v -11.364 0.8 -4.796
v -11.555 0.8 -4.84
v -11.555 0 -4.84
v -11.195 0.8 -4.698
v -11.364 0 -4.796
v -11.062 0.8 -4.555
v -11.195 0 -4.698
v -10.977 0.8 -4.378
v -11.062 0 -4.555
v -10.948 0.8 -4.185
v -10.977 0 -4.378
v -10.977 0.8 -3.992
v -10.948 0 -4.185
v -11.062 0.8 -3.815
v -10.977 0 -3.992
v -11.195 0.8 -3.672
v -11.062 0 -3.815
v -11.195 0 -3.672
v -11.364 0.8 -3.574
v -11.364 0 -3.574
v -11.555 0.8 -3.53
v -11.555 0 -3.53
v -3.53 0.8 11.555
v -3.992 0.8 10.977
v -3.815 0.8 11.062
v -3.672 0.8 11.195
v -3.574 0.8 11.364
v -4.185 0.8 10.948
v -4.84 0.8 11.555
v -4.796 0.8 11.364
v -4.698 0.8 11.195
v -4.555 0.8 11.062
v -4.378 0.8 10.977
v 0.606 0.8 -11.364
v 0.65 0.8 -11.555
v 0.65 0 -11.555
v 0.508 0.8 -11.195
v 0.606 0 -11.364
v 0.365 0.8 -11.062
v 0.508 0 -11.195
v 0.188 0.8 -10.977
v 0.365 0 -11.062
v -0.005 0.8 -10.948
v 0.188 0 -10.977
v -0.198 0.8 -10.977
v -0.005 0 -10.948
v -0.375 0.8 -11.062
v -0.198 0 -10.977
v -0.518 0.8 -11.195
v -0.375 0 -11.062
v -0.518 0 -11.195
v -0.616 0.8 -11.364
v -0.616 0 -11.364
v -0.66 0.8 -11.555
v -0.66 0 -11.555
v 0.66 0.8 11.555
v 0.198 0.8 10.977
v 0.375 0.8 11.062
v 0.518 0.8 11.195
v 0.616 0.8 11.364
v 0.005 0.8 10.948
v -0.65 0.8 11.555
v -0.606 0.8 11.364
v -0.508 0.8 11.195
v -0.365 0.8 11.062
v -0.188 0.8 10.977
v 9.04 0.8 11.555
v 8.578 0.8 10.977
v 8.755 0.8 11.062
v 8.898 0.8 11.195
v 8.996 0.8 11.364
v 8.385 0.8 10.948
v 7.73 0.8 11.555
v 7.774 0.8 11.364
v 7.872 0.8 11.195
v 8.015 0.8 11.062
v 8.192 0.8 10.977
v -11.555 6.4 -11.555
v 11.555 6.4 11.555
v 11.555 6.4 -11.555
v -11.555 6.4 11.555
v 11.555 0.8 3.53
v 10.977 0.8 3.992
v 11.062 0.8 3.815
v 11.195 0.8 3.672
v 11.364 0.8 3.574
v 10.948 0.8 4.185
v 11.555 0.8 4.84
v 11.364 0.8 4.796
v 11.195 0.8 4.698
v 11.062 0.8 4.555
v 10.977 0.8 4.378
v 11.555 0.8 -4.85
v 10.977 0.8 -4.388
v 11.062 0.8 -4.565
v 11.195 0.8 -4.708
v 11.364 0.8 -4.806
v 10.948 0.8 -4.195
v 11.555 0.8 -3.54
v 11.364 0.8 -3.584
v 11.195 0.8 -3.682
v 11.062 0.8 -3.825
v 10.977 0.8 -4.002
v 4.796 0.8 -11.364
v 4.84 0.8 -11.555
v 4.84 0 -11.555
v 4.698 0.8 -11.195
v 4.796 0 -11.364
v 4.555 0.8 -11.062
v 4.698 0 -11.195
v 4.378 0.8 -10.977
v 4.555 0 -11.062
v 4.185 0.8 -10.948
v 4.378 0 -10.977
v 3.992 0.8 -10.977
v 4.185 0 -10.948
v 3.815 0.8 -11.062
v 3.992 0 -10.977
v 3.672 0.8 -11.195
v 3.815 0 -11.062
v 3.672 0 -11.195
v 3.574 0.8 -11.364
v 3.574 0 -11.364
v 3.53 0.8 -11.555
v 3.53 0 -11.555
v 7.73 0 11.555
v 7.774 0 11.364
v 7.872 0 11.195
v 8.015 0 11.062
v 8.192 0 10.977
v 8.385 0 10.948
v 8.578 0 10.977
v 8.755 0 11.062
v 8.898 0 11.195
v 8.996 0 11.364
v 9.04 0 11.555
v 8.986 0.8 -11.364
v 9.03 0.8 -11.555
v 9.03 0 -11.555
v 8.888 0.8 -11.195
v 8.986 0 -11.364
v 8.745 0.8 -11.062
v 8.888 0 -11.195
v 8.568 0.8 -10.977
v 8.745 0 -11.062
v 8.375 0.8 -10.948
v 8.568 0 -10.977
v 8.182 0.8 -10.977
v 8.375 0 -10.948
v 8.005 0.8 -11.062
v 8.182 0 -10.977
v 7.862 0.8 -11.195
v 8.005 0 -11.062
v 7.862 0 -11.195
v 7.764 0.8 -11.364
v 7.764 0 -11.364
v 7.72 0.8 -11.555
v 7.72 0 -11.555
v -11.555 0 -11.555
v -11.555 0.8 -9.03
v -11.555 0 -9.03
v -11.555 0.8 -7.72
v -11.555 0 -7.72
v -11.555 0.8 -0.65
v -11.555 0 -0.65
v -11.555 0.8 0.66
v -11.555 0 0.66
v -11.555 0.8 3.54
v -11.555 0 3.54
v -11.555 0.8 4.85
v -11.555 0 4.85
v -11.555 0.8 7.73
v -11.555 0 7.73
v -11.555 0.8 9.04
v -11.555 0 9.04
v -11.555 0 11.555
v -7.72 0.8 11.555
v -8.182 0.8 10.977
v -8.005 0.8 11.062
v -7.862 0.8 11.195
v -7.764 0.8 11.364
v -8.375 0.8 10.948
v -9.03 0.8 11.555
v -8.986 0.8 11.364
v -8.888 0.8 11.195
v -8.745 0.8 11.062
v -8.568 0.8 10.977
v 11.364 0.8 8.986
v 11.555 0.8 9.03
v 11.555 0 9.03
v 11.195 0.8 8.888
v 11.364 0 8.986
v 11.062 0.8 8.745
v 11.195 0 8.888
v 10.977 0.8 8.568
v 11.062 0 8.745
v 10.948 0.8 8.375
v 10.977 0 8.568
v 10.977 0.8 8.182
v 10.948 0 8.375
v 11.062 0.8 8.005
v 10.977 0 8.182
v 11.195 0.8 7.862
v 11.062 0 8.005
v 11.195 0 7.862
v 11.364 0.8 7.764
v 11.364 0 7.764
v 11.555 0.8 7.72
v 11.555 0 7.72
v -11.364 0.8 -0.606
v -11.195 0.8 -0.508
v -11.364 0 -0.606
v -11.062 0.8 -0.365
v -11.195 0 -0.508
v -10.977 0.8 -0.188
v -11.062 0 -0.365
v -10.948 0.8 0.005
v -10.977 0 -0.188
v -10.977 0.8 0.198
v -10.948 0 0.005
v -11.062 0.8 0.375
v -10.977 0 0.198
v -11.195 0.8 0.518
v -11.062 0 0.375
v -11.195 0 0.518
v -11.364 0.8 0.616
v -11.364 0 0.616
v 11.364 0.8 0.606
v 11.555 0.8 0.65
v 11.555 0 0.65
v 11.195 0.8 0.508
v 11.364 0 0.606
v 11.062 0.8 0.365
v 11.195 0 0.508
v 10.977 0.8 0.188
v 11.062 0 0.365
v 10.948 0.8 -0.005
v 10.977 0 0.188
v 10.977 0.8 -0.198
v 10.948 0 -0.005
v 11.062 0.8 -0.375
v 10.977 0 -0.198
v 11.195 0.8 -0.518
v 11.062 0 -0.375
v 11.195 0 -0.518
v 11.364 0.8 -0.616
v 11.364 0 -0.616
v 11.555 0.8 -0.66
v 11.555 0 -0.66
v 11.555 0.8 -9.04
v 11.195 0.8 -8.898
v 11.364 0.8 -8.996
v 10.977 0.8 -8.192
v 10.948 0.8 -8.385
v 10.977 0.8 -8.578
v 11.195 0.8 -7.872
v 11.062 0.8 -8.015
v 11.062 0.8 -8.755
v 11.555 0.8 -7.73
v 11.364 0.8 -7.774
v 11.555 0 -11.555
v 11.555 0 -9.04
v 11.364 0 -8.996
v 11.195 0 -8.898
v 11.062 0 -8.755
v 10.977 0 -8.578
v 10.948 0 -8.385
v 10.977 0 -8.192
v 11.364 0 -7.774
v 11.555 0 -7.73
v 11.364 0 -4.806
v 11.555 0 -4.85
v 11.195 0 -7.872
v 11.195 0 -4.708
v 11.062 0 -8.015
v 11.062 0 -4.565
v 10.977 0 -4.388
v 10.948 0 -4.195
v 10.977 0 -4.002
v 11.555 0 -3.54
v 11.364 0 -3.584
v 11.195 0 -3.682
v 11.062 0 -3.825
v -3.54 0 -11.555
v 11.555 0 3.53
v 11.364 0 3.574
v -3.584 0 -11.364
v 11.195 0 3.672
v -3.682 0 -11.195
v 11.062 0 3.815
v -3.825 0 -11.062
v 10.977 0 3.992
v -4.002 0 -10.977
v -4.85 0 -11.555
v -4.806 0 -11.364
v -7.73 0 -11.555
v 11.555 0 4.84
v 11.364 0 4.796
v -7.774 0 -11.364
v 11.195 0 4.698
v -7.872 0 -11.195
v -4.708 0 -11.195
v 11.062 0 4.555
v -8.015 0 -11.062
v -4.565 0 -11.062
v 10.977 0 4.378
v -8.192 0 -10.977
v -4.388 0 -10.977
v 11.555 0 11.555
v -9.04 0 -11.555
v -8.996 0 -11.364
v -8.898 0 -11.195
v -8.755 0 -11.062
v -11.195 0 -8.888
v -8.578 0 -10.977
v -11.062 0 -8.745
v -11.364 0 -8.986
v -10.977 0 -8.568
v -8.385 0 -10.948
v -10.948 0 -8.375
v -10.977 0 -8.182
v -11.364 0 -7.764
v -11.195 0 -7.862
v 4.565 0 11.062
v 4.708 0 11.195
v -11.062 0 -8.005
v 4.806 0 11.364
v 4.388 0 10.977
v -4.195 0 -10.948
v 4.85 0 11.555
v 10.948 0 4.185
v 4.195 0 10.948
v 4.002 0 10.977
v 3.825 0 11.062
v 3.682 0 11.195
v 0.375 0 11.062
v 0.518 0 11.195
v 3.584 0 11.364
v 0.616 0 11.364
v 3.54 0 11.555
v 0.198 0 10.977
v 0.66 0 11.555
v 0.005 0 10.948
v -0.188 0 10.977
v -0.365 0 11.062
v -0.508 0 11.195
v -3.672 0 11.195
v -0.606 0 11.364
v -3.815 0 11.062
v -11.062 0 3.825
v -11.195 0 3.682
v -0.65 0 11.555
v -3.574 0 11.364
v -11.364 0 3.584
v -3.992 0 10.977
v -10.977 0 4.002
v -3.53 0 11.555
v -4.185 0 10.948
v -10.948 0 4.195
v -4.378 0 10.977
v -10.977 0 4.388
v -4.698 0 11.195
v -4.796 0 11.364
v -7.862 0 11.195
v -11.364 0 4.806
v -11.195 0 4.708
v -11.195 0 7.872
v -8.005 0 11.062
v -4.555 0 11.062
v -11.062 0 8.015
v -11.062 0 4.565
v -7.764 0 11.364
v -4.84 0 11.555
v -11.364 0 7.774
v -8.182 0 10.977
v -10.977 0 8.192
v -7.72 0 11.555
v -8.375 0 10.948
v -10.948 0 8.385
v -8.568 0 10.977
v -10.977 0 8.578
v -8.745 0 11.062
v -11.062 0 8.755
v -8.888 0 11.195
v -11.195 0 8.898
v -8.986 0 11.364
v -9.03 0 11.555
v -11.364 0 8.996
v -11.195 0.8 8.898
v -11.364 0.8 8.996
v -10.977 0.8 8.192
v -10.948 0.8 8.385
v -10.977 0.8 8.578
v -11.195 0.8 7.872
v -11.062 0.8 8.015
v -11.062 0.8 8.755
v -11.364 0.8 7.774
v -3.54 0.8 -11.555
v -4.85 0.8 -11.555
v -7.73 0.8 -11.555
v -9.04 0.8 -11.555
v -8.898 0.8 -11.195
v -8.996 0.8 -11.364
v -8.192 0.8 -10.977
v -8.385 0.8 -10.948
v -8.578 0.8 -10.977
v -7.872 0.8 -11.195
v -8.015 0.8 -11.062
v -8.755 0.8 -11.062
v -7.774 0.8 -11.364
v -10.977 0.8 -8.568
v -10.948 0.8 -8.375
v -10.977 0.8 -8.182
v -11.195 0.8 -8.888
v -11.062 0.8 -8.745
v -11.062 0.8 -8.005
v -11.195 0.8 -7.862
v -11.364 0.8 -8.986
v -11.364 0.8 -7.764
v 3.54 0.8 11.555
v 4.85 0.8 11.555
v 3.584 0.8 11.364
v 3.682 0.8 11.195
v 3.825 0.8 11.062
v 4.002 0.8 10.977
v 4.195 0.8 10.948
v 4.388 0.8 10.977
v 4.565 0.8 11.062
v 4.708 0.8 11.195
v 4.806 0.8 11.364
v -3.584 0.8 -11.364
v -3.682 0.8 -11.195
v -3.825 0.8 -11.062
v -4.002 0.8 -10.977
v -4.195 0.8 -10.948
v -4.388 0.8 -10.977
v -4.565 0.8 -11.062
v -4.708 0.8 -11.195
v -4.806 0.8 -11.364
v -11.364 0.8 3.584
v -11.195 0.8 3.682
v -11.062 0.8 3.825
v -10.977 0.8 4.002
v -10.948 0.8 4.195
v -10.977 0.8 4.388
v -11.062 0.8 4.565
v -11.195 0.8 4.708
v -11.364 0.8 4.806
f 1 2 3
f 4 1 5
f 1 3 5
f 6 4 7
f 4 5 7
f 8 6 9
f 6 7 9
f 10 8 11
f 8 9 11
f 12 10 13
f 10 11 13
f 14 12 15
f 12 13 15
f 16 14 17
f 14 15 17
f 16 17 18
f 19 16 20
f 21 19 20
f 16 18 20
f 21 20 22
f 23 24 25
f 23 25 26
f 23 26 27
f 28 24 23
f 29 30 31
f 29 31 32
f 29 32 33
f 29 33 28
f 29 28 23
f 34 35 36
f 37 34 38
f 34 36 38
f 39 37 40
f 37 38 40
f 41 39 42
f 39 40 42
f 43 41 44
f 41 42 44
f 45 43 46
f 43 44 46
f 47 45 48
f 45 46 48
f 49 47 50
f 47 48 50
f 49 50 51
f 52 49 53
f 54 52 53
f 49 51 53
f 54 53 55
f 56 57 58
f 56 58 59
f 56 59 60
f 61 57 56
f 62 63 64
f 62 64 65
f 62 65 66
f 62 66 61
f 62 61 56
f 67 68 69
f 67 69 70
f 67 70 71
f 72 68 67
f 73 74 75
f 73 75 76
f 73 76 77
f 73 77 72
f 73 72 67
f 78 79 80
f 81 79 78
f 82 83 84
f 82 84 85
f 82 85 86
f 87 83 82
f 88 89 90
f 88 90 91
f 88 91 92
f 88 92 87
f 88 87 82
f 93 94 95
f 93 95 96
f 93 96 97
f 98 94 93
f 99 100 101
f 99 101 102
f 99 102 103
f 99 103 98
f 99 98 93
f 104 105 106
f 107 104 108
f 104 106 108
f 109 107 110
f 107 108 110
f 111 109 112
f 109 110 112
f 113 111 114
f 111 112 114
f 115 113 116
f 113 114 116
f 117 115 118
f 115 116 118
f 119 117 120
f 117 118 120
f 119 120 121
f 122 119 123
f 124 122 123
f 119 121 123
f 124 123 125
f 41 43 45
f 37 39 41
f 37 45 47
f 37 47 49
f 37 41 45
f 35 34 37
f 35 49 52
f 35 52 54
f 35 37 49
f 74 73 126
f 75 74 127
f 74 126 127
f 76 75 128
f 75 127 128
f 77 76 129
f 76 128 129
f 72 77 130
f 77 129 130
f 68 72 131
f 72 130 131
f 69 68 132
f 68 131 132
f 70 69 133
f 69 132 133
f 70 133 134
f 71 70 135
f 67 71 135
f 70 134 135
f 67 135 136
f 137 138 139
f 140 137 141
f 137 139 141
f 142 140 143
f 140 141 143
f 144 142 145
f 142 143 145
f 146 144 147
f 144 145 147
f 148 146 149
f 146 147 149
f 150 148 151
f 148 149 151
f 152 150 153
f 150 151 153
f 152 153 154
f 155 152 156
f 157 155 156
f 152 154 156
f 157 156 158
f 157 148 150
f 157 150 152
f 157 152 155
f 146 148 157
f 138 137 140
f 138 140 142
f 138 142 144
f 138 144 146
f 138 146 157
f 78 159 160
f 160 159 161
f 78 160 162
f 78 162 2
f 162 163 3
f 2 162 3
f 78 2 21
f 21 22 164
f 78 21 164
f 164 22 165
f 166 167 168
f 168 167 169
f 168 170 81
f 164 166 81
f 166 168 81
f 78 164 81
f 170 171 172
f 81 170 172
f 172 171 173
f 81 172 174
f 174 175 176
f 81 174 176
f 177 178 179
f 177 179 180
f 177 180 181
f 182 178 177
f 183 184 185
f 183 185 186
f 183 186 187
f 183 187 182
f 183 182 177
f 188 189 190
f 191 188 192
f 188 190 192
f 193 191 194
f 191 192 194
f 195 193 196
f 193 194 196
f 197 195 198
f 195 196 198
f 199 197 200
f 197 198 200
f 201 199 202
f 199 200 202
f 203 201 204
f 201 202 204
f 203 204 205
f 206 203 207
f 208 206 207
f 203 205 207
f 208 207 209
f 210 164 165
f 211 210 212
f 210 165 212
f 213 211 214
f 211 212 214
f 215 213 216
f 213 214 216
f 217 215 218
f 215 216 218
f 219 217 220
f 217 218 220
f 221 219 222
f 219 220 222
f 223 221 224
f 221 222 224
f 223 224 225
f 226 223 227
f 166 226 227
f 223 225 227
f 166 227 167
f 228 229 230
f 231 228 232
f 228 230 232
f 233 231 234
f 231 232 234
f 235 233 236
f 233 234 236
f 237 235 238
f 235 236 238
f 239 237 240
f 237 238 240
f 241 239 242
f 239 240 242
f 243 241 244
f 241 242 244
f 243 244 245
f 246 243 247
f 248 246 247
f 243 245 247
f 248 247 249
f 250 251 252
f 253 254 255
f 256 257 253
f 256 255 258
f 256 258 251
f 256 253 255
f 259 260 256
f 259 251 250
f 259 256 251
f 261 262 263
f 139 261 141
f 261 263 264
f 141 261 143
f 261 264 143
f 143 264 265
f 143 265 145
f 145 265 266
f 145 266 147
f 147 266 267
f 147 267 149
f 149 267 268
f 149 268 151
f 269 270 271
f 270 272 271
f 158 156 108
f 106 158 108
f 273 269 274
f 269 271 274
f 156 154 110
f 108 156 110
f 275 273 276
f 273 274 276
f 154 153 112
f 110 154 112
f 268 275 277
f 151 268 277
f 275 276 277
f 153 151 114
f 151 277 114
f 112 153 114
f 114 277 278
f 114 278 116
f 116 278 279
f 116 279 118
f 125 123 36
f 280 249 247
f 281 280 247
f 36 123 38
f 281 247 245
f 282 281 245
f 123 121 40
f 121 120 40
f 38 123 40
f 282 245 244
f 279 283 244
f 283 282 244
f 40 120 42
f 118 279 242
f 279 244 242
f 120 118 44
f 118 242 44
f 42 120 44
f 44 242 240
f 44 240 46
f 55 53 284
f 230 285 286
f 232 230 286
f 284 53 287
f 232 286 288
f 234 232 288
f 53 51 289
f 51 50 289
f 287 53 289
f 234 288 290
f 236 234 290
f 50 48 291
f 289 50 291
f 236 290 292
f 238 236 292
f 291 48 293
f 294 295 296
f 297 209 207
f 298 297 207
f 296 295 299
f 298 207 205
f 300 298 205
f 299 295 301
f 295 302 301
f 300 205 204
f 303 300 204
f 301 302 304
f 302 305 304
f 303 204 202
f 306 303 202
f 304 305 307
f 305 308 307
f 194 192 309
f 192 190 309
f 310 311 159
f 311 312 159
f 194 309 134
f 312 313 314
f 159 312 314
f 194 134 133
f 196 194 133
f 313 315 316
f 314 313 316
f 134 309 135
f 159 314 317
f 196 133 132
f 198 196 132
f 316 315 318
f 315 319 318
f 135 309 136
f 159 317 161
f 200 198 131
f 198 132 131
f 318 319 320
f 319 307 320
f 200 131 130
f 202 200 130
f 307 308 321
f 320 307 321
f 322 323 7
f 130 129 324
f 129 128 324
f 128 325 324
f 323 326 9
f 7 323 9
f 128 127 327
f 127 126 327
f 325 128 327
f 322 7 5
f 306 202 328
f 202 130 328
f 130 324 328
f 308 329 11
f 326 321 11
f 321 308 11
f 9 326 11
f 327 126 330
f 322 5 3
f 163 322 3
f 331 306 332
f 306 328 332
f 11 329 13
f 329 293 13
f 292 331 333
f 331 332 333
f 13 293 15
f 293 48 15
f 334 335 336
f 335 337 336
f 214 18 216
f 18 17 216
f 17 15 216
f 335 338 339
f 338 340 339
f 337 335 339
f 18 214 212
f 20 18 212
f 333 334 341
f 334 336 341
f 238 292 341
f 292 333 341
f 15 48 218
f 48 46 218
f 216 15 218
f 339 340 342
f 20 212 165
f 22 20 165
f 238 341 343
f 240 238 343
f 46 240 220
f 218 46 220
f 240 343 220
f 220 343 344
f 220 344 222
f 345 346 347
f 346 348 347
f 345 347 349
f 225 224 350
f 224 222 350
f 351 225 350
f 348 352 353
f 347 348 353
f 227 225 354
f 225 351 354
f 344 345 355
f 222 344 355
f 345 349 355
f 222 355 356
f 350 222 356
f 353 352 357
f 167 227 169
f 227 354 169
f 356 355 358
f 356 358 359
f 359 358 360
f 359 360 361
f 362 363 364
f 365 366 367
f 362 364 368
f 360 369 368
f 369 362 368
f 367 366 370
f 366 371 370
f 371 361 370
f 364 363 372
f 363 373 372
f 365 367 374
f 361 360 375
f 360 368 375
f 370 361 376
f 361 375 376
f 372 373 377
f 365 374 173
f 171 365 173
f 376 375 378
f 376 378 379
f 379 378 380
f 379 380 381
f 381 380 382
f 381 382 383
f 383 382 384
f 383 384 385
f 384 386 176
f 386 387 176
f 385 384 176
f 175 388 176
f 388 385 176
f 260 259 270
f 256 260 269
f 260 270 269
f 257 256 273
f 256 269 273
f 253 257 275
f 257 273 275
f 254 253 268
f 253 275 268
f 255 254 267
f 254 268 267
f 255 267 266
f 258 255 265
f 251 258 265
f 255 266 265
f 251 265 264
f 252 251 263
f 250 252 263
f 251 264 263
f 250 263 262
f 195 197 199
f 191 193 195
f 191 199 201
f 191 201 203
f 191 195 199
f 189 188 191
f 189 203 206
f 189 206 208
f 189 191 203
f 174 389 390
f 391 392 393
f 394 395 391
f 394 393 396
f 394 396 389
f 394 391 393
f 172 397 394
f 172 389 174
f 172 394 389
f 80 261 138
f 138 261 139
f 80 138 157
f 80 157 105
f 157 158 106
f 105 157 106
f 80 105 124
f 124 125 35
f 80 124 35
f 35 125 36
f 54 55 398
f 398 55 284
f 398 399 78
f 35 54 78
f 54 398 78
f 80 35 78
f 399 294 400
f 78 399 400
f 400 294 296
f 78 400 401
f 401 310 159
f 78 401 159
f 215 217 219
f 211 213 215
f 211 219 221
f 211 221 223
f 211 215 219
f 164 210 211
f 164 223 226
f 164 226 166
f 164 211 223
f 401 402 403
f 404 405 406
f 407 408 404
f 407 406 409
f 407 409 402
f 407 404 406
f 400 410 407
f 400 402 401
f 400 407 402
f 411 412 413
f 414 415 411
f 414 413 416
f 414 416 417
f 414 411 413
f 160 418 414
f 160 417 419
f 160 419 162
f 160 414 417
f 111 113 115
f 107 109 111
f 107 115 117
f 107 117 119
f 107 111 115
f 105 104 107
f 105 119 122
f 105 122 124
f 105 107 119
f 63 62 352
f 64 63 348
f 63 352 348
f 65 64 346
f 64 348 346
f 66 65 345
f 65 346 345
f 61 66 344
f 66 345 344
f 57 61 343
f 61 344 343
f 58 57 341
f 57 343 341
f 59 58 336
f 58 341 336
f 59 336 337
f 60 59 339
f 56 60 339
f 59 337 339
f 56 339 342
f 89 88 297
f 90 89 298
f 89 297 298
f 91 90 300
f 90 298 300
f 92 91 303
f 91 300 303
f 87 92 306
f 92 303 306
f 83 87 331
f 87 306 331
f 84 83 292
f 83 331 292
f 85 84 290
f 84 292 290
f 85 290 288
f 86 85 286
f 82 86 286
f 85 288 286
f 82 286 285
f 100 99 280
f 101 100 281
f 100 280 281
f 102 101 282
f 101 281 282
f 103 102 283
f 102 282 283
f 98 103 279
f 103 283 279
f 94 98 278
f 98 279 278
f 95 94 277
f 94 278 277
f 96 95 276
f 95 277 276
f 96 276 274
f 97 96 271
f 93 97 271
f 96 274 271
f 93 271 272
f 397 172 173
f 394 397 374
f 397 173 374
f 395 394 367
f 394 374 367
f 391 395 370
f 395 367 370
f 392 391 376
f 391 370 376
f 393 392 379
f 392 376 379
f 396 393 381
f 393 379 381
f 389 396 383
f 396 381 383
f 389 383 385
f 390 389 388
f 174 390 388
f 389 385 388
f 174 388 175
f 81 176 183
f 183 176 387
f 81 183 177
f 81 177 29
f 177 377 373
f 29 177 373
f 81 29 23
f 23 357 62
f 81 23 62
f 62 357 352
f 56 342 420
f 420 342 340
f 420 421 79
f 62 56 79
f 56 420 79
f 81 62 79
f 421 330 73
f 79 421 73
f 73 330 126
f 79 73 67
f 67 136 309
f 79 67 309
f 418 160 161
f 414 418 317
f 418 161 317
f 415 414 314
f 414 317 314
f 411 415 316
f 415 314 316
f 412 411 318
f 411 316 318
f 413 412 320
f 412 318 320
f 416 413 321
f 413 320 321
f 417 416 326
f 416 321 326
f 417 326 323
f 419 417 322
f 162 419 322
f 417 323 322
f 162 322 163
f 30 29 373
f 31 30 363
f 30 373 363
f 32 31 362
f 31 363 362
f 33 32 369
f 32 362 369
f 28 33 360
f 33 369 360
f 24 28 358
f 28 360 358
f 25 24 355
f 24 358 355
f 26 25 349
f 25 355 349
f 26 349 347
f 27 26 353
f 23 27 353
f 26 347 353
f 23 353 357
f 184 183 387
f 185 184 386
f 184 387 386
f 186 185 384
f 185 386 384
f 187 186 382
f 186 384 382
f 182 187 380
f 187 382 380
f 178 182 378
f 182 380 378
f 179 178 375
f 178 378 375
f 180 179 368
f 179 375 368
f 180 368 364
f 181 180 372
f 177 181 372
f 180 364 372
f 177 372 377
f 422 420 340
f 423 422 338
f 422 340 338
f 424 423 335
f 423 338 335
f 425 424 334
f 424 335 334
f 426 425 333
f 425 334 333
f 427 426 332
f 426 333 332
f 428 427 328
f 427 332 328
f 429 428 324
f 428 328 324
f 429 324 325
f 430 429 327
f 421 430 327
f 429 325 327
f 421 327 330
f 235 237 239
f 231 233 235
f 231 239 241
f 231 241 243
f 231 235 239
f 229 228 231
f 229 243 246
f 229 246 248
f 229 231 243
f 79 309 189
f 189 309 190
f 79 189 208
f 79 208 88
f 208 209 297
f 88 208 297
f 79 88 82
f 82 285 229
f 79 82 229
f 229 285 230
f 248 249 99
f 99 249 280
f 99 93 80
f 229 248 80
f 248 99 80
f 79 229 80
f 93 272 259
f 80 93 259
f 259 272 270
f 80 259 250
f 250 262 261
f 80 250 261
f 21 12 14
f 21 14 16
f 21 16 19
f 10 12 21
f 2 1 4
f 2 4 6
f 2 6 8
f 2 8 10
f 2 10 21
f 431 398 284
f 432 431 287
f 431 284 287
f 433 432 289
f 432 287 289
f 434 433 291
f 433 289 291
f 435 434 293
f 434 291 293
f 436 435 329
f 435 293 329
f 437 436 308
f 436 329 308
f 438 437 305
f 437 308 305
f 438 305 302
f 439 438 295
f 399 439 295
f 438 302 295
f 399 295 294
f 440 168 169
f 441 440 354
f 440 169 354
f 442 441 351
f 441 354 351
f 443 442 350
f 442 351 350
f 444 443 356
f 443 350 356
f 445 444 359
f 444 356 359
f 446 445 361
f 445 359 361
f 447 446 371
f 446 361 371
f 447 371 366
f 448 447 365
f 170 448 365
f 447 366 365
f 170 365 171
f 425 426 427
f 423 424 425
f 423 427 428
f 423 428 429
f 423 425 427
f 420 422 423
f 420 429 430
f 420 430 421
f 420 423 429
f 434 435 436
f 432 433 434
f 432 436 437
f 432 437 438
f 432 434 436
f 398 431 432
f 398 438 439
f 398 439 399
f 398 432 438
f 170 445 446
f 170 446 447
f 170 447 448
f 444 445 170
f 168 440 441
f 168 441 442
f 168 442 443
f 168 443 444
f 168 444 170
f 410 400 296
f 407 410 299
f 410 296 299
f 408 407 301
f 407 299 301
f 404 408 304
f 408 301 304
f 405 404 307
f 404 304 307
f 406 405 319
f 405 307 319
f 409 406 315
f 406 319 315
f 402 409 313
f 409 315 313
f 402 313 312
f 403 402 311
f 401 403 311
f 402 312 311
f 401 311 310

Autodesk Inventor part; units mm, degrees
ref_plane "YZ Plane" through (0, 0, 0) normal (1, 0, 0) x (0, 1, 0)
ref_plane "XZ Plane" through (0, 0, 0) normal (0, 1, 0) x (-1, 0, 0)
ref_plane "XY Plane" through (0, 0, 0) normal (0, 0, 1) x (1, 0, 0)
sketch "Sketch1" plane through (0, 0, 0) normal (0, 1, 0) x (-1, 0, 0)
  line L0 (11.555, 11.555) -> (-11.555, 11.555)
  line L1 (-11.555, 11.555) -> (-11.555, -11.555)
  line L2 (-11.555, -11.555) -> (11.555, -11.555)
  line L3 (11.555, -11.555) -> (11.555, 11.555)
  point P0 (0, 0)
  dimension "d0" = 23.11
  dimension "d1" = 23.11
  dimension "d2" = 11.555
  dimension "d3" = 11.555
extrude "Extrusion1" add sketch "Sketch1" along normal blind 6.4
sketch "Sketch2" plane through (0, 0, 0) normal (0, -1, 0) x (1, 0, 0)
  line L0 (11.605, 9.135) -> (10.135, 9.135)
  line L1 (10.135, 9.135) -> (10.135, 7.615)
  line L2 (10.135, 7.615) -> (11.605, 7.615)
  line L3 (11.605, 7.615) -> (11.605, 9.135)
  line L4 (11.555, 11.555) -> (11.555, -11.555) projected
  line L5 (-11.555, 11.555) -> (11.555, 11.555) projected
  circle A0 centre (11.605, 8.375) radius 0.6568
  point P0 (0, 0)
  dimension "d6" = 1.52
  dimension "d7" = 1.47
  dimension "d8" = 0.05
  dimension "d9" = 2.42
extrude "Extrusion2" cut sketch "Sketch2" against normal blind 0.8 contours A0 L3 | L3 A0 L4 | L4 A0
pattern_linear "Rectangular Pattern1" count 5 spacing 4.19 along (0, 0, -1) of "Extrusion2"
pattern_circular "Circular Pattern1" count 4 over 360 about axis through (0, -10, 0) along (0, 1, 0) of "Extrusion2", "Rectangular Pattern1"
properties part number "MC_JG1228"
